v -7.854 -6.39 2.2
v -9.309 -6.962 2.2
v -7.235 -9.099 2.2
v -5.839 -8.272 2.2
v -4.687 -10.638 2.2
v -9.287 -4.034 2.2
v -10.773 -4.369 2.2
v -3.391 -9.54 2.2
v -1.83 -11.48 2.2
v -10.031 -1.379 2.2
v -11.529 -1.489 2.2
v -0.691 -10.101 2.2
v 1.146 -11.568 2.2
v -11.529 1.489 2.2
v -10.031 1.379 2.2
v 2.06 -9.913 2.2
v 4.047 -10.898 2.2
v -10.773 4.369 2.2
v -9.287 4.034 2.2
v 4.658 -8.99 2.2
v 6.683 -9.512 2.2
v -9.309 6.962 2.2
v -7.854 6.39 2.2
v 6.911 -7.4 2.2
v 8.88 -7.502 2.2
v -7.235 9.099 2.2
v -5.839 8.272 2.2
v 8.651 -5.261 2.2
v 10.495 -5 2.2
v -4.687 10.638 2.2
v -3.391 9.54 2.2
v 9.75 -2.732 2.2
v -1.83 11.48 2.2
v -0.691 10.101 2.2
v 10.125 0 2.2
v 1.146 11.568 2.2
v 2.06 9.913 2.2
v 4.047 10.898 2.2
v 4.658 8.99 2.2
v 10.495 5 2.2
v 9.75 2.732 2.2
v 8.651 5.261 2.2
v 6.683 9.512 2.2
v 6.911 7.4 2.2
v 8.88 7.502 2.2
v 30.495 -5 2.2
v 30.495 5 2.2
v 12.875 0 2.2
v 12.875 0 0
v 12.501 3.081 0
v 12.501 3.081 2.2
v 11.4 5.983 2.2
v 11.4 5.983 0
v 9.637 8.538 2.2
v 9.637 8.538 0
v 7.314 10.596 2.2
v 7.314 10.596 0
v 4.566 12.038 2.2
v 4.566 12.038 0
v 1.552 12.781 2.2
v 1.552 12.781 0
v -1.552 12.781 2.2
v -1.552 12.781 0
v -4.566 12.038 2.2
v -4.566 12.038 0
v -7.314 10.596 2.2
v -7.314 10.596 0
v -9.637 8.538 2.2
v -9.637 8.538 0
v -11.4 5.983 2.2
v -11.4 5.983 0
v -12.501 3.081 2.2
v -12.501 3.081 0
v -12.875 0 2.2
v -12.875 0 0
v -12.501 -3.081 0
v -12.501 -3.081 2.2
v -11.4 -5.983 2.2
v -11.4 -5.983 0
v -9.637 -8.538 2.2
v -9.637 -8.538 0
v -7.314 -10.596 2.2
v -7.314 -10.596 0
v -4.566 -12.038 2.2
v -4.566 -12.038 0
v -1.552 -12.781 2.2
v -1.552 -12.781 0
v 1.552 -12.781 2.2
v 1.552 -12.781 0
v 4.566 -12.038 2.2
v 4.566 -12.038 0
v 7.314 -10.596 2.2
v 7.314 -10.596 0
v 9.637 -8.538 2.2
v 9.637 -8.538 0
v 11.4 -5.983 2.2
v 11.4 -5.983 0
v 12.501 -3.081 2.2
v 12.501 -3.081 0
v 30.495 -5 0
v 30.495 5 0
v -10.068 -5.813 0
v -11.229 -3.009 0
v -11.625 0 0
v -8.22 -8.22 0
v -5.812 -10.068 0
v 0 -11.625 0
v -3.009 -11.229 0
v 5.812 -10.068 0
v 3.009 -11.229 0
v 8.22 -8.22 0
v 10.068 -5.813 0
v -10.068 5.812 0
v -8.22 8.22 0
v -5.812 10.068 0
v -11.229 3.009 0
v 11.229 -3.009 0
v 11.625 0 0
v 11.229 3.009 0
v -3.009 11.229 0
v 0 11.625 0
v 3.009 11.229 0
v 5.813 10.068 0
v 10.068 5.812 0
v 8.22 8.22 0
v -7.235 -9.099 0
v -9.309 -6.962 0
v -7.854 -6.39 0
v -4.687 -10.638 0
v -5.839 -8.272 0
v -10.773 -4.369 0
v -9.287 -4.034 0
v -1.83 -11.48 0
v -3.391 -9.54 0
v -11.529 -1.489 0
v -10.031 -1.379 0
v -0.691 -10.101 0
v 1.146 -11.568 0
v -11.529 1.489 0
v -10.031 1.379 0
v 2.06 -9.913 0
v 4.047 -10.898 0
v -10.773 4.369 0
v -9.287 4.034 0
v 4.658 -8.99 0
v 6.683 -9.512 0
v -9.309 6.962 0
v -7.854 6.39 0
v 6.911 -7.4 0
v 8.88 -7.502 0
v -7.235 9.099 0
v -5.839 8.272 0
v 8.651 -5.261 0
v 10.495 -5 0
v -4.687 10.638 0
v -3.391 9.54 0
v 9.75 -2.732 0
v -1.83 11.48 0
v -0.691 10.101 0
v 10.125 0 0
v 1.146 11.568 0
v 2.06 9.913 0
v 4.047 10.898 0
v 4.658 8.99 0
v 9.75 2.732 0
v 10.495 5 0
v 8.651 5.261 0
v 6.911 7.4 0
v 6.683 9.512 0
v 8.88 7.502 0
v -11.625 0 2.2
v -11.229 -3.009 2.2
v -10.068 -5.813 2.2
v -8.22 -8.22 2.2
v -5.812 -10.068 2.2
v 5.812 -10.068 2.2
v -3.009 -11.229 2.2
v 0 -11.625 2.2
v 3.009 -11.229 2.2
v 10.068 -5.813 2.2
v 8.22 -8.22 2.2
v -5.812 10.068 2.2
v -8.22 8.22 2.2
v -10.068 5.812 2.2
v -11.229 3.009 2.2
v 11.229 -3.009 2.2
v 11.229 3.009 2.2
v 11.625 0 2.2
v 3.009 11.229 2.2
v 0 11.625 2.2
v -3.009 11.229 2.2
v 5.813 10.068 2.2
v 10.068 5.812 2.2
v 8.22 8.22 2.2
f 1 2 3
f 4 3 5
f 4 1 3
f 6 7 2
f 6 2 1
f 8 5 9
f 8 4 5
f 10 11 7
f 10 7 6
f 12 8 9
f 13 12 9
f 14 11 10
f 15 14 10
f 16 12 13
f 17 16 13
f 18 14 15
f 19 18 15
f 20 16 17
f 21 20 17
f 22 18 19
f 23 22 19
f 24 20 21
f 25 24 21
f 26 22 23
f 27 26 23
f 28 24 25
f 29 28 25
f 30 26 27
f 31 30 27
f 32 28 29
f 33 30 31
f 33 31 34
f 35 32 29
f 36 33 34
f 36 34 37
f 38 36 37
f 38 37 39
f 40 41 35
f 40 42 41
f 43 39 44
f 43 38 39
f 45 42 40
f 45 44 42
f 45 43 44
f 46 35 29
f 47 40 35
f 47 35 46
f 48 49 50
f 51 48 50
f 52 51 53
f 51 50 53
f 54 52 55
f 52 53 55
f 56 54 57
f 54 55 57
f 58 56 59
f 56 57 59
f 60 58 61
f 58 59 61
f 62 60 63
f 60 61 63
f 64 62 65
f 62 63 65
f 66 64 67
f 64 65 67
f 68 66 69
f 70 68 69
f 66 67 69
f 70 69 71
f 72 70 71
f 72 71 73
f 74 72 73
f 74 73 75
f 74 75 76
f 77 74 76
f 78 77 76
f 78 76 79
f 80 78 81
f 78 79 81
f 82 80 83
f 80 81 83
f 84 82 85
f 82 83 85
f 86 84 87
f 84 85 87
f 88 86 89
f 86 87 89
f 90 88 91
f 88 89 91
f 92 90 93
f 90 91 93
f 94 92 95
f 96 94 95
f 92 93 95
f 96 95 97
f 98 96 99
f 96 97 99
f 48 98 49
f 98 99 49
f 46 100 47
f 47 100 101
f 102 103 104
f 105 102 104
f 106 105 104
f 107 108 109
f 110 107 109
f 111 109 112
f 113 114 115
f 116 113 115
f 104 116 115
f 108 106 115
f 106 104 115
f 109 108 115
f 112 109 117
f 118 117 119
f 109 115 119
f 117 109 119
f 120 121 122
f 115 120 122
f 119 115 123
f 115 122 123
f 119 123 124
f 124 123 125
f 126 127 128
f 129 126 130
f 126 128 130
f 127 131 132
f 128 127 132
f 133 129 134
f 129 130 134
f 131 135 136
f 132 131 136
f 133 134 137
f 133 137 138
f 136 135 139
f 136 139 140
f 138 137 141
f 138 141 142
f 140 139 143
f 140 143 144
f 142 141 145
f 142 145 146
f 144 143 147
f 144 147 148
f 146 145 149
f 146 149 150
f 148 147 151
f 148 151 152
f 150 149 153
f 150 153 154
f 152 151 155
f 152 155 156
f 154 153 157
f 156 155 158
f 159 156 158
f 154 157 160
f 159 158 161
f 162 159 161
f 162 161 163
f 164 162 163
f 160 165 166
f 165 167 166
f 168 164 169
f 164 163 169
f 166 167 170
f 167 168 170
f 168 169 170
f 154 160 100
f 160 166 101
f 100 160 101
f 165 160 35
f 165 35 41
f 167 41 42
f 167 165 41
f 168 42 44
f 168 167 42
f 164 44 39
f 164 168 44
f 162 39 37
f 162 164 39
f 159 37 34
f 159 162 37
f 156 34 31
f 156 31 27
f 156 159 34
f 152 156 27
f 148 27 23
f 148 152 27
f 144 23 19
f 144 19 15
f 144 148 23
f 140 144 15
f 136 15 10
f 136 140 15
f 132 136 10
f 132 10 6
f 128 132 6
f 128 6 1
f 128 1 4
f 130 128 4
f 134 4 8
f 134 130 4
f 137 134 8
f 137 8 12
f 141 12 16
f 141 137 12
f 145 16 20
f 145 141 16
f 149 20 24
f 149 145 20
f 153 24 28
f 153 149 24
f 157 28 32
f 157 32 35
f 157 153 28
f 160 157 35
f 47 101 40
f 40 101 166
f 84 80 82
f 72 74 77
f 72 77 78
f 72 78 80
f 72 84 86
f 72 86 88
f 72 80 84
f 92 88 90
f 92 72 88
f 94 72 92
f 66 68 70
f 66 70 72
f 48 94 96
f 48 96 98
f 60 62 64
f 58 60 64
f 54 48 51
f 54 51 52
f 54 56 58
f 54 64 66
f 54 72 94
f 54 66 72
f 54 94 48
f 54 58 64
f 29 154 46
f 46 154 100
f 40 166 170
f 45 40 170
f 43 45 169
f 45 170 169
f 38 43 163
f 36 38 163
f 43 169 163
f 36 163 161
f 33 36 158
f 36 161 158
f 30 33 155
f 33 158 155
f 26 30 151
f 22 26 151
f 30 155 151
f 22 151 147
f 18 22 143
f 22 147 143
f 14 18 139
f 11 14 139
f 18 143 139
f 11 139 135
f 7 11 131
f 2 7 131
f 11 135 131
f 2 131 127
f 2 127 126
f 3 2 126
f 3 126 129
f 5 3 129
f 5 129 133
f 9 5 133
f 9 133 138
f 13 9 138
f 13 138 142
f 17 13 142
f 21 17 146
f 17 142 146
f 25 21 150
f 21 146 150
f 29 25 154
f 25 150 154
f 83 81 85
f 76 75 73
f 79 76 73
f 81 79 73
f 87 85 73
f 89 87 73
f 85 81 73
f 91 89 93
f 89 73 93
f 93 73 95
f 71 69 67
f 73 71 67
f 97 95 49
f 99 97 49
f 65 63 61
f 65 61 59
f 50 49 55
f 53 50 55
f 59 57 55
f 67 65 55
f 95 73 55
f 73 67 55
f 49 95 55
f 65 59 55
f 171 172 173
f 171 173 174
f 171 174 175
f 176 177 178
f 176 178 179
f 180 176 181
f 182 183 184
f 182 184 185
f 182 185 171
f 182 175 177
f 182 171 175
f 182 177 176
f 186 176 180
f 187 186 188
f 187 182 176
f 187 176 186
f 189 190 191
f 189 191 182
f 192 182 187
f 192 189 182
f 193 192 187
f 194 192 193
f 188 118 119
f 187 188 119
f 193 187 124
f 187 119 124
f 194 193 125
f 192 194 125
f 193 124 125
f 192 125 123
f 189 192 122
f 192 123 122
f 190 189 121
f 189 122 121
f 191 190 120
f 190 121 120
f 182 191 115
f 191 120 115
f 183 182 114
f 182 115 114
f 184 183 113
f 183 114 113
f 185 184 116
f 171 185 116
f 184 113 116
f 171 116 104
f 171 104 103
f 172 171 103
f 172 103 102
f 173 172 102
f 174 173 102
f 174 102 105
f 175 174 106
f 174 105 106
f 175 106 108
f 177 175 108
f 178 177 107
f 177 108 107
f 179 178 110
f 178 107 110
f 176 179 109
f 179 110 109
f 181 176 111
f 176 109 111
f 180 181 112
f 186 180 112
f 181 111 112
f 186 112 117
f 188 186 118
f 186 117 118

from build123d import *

# Parameters (mm, degrees)
F0_R     = 12.875
F1_DEPTH = 2.2
F2_R     = 11.625
F3_DEPTH = 2.2
F4_R     = 10.125
F5_DEPTH = 2.2


with BuildPart() as f1:
    # F0 (on Top) → F1 (new body)
    with BuildSketch(Plane.XY):
        Circle(F0_R)
    extrude(amount=F1_DEPTH)


with BuildPart() as f3:
    # F2 (on Top) → F3 (new body)
    with BuildSketch(Plane.XY):
        Circle(F2_R)
    extrude(amount=F3_DEPTH)


with BuildPart() as f5:
    # F4 (on Top) → F5 (new body)
    with BuildSketch(Plane.XY):
        with BuildLine():
            Line((30.49479, 5), (10.49479, 5))
            ThreePointArc((10.49479, 5), (-11.625, 0), (10.49479, -5))
            Line((10.49479, -5), (30.49479, -5))
            Line((30.49479, -5), (30.49479, 5))
        make_face()
        Circle(F4_R, mode=Mode.SUBTRACT)
    extrude(amount=F5_DEPTH)


solid = Compound([f1.part, f3.part, f5.part])
